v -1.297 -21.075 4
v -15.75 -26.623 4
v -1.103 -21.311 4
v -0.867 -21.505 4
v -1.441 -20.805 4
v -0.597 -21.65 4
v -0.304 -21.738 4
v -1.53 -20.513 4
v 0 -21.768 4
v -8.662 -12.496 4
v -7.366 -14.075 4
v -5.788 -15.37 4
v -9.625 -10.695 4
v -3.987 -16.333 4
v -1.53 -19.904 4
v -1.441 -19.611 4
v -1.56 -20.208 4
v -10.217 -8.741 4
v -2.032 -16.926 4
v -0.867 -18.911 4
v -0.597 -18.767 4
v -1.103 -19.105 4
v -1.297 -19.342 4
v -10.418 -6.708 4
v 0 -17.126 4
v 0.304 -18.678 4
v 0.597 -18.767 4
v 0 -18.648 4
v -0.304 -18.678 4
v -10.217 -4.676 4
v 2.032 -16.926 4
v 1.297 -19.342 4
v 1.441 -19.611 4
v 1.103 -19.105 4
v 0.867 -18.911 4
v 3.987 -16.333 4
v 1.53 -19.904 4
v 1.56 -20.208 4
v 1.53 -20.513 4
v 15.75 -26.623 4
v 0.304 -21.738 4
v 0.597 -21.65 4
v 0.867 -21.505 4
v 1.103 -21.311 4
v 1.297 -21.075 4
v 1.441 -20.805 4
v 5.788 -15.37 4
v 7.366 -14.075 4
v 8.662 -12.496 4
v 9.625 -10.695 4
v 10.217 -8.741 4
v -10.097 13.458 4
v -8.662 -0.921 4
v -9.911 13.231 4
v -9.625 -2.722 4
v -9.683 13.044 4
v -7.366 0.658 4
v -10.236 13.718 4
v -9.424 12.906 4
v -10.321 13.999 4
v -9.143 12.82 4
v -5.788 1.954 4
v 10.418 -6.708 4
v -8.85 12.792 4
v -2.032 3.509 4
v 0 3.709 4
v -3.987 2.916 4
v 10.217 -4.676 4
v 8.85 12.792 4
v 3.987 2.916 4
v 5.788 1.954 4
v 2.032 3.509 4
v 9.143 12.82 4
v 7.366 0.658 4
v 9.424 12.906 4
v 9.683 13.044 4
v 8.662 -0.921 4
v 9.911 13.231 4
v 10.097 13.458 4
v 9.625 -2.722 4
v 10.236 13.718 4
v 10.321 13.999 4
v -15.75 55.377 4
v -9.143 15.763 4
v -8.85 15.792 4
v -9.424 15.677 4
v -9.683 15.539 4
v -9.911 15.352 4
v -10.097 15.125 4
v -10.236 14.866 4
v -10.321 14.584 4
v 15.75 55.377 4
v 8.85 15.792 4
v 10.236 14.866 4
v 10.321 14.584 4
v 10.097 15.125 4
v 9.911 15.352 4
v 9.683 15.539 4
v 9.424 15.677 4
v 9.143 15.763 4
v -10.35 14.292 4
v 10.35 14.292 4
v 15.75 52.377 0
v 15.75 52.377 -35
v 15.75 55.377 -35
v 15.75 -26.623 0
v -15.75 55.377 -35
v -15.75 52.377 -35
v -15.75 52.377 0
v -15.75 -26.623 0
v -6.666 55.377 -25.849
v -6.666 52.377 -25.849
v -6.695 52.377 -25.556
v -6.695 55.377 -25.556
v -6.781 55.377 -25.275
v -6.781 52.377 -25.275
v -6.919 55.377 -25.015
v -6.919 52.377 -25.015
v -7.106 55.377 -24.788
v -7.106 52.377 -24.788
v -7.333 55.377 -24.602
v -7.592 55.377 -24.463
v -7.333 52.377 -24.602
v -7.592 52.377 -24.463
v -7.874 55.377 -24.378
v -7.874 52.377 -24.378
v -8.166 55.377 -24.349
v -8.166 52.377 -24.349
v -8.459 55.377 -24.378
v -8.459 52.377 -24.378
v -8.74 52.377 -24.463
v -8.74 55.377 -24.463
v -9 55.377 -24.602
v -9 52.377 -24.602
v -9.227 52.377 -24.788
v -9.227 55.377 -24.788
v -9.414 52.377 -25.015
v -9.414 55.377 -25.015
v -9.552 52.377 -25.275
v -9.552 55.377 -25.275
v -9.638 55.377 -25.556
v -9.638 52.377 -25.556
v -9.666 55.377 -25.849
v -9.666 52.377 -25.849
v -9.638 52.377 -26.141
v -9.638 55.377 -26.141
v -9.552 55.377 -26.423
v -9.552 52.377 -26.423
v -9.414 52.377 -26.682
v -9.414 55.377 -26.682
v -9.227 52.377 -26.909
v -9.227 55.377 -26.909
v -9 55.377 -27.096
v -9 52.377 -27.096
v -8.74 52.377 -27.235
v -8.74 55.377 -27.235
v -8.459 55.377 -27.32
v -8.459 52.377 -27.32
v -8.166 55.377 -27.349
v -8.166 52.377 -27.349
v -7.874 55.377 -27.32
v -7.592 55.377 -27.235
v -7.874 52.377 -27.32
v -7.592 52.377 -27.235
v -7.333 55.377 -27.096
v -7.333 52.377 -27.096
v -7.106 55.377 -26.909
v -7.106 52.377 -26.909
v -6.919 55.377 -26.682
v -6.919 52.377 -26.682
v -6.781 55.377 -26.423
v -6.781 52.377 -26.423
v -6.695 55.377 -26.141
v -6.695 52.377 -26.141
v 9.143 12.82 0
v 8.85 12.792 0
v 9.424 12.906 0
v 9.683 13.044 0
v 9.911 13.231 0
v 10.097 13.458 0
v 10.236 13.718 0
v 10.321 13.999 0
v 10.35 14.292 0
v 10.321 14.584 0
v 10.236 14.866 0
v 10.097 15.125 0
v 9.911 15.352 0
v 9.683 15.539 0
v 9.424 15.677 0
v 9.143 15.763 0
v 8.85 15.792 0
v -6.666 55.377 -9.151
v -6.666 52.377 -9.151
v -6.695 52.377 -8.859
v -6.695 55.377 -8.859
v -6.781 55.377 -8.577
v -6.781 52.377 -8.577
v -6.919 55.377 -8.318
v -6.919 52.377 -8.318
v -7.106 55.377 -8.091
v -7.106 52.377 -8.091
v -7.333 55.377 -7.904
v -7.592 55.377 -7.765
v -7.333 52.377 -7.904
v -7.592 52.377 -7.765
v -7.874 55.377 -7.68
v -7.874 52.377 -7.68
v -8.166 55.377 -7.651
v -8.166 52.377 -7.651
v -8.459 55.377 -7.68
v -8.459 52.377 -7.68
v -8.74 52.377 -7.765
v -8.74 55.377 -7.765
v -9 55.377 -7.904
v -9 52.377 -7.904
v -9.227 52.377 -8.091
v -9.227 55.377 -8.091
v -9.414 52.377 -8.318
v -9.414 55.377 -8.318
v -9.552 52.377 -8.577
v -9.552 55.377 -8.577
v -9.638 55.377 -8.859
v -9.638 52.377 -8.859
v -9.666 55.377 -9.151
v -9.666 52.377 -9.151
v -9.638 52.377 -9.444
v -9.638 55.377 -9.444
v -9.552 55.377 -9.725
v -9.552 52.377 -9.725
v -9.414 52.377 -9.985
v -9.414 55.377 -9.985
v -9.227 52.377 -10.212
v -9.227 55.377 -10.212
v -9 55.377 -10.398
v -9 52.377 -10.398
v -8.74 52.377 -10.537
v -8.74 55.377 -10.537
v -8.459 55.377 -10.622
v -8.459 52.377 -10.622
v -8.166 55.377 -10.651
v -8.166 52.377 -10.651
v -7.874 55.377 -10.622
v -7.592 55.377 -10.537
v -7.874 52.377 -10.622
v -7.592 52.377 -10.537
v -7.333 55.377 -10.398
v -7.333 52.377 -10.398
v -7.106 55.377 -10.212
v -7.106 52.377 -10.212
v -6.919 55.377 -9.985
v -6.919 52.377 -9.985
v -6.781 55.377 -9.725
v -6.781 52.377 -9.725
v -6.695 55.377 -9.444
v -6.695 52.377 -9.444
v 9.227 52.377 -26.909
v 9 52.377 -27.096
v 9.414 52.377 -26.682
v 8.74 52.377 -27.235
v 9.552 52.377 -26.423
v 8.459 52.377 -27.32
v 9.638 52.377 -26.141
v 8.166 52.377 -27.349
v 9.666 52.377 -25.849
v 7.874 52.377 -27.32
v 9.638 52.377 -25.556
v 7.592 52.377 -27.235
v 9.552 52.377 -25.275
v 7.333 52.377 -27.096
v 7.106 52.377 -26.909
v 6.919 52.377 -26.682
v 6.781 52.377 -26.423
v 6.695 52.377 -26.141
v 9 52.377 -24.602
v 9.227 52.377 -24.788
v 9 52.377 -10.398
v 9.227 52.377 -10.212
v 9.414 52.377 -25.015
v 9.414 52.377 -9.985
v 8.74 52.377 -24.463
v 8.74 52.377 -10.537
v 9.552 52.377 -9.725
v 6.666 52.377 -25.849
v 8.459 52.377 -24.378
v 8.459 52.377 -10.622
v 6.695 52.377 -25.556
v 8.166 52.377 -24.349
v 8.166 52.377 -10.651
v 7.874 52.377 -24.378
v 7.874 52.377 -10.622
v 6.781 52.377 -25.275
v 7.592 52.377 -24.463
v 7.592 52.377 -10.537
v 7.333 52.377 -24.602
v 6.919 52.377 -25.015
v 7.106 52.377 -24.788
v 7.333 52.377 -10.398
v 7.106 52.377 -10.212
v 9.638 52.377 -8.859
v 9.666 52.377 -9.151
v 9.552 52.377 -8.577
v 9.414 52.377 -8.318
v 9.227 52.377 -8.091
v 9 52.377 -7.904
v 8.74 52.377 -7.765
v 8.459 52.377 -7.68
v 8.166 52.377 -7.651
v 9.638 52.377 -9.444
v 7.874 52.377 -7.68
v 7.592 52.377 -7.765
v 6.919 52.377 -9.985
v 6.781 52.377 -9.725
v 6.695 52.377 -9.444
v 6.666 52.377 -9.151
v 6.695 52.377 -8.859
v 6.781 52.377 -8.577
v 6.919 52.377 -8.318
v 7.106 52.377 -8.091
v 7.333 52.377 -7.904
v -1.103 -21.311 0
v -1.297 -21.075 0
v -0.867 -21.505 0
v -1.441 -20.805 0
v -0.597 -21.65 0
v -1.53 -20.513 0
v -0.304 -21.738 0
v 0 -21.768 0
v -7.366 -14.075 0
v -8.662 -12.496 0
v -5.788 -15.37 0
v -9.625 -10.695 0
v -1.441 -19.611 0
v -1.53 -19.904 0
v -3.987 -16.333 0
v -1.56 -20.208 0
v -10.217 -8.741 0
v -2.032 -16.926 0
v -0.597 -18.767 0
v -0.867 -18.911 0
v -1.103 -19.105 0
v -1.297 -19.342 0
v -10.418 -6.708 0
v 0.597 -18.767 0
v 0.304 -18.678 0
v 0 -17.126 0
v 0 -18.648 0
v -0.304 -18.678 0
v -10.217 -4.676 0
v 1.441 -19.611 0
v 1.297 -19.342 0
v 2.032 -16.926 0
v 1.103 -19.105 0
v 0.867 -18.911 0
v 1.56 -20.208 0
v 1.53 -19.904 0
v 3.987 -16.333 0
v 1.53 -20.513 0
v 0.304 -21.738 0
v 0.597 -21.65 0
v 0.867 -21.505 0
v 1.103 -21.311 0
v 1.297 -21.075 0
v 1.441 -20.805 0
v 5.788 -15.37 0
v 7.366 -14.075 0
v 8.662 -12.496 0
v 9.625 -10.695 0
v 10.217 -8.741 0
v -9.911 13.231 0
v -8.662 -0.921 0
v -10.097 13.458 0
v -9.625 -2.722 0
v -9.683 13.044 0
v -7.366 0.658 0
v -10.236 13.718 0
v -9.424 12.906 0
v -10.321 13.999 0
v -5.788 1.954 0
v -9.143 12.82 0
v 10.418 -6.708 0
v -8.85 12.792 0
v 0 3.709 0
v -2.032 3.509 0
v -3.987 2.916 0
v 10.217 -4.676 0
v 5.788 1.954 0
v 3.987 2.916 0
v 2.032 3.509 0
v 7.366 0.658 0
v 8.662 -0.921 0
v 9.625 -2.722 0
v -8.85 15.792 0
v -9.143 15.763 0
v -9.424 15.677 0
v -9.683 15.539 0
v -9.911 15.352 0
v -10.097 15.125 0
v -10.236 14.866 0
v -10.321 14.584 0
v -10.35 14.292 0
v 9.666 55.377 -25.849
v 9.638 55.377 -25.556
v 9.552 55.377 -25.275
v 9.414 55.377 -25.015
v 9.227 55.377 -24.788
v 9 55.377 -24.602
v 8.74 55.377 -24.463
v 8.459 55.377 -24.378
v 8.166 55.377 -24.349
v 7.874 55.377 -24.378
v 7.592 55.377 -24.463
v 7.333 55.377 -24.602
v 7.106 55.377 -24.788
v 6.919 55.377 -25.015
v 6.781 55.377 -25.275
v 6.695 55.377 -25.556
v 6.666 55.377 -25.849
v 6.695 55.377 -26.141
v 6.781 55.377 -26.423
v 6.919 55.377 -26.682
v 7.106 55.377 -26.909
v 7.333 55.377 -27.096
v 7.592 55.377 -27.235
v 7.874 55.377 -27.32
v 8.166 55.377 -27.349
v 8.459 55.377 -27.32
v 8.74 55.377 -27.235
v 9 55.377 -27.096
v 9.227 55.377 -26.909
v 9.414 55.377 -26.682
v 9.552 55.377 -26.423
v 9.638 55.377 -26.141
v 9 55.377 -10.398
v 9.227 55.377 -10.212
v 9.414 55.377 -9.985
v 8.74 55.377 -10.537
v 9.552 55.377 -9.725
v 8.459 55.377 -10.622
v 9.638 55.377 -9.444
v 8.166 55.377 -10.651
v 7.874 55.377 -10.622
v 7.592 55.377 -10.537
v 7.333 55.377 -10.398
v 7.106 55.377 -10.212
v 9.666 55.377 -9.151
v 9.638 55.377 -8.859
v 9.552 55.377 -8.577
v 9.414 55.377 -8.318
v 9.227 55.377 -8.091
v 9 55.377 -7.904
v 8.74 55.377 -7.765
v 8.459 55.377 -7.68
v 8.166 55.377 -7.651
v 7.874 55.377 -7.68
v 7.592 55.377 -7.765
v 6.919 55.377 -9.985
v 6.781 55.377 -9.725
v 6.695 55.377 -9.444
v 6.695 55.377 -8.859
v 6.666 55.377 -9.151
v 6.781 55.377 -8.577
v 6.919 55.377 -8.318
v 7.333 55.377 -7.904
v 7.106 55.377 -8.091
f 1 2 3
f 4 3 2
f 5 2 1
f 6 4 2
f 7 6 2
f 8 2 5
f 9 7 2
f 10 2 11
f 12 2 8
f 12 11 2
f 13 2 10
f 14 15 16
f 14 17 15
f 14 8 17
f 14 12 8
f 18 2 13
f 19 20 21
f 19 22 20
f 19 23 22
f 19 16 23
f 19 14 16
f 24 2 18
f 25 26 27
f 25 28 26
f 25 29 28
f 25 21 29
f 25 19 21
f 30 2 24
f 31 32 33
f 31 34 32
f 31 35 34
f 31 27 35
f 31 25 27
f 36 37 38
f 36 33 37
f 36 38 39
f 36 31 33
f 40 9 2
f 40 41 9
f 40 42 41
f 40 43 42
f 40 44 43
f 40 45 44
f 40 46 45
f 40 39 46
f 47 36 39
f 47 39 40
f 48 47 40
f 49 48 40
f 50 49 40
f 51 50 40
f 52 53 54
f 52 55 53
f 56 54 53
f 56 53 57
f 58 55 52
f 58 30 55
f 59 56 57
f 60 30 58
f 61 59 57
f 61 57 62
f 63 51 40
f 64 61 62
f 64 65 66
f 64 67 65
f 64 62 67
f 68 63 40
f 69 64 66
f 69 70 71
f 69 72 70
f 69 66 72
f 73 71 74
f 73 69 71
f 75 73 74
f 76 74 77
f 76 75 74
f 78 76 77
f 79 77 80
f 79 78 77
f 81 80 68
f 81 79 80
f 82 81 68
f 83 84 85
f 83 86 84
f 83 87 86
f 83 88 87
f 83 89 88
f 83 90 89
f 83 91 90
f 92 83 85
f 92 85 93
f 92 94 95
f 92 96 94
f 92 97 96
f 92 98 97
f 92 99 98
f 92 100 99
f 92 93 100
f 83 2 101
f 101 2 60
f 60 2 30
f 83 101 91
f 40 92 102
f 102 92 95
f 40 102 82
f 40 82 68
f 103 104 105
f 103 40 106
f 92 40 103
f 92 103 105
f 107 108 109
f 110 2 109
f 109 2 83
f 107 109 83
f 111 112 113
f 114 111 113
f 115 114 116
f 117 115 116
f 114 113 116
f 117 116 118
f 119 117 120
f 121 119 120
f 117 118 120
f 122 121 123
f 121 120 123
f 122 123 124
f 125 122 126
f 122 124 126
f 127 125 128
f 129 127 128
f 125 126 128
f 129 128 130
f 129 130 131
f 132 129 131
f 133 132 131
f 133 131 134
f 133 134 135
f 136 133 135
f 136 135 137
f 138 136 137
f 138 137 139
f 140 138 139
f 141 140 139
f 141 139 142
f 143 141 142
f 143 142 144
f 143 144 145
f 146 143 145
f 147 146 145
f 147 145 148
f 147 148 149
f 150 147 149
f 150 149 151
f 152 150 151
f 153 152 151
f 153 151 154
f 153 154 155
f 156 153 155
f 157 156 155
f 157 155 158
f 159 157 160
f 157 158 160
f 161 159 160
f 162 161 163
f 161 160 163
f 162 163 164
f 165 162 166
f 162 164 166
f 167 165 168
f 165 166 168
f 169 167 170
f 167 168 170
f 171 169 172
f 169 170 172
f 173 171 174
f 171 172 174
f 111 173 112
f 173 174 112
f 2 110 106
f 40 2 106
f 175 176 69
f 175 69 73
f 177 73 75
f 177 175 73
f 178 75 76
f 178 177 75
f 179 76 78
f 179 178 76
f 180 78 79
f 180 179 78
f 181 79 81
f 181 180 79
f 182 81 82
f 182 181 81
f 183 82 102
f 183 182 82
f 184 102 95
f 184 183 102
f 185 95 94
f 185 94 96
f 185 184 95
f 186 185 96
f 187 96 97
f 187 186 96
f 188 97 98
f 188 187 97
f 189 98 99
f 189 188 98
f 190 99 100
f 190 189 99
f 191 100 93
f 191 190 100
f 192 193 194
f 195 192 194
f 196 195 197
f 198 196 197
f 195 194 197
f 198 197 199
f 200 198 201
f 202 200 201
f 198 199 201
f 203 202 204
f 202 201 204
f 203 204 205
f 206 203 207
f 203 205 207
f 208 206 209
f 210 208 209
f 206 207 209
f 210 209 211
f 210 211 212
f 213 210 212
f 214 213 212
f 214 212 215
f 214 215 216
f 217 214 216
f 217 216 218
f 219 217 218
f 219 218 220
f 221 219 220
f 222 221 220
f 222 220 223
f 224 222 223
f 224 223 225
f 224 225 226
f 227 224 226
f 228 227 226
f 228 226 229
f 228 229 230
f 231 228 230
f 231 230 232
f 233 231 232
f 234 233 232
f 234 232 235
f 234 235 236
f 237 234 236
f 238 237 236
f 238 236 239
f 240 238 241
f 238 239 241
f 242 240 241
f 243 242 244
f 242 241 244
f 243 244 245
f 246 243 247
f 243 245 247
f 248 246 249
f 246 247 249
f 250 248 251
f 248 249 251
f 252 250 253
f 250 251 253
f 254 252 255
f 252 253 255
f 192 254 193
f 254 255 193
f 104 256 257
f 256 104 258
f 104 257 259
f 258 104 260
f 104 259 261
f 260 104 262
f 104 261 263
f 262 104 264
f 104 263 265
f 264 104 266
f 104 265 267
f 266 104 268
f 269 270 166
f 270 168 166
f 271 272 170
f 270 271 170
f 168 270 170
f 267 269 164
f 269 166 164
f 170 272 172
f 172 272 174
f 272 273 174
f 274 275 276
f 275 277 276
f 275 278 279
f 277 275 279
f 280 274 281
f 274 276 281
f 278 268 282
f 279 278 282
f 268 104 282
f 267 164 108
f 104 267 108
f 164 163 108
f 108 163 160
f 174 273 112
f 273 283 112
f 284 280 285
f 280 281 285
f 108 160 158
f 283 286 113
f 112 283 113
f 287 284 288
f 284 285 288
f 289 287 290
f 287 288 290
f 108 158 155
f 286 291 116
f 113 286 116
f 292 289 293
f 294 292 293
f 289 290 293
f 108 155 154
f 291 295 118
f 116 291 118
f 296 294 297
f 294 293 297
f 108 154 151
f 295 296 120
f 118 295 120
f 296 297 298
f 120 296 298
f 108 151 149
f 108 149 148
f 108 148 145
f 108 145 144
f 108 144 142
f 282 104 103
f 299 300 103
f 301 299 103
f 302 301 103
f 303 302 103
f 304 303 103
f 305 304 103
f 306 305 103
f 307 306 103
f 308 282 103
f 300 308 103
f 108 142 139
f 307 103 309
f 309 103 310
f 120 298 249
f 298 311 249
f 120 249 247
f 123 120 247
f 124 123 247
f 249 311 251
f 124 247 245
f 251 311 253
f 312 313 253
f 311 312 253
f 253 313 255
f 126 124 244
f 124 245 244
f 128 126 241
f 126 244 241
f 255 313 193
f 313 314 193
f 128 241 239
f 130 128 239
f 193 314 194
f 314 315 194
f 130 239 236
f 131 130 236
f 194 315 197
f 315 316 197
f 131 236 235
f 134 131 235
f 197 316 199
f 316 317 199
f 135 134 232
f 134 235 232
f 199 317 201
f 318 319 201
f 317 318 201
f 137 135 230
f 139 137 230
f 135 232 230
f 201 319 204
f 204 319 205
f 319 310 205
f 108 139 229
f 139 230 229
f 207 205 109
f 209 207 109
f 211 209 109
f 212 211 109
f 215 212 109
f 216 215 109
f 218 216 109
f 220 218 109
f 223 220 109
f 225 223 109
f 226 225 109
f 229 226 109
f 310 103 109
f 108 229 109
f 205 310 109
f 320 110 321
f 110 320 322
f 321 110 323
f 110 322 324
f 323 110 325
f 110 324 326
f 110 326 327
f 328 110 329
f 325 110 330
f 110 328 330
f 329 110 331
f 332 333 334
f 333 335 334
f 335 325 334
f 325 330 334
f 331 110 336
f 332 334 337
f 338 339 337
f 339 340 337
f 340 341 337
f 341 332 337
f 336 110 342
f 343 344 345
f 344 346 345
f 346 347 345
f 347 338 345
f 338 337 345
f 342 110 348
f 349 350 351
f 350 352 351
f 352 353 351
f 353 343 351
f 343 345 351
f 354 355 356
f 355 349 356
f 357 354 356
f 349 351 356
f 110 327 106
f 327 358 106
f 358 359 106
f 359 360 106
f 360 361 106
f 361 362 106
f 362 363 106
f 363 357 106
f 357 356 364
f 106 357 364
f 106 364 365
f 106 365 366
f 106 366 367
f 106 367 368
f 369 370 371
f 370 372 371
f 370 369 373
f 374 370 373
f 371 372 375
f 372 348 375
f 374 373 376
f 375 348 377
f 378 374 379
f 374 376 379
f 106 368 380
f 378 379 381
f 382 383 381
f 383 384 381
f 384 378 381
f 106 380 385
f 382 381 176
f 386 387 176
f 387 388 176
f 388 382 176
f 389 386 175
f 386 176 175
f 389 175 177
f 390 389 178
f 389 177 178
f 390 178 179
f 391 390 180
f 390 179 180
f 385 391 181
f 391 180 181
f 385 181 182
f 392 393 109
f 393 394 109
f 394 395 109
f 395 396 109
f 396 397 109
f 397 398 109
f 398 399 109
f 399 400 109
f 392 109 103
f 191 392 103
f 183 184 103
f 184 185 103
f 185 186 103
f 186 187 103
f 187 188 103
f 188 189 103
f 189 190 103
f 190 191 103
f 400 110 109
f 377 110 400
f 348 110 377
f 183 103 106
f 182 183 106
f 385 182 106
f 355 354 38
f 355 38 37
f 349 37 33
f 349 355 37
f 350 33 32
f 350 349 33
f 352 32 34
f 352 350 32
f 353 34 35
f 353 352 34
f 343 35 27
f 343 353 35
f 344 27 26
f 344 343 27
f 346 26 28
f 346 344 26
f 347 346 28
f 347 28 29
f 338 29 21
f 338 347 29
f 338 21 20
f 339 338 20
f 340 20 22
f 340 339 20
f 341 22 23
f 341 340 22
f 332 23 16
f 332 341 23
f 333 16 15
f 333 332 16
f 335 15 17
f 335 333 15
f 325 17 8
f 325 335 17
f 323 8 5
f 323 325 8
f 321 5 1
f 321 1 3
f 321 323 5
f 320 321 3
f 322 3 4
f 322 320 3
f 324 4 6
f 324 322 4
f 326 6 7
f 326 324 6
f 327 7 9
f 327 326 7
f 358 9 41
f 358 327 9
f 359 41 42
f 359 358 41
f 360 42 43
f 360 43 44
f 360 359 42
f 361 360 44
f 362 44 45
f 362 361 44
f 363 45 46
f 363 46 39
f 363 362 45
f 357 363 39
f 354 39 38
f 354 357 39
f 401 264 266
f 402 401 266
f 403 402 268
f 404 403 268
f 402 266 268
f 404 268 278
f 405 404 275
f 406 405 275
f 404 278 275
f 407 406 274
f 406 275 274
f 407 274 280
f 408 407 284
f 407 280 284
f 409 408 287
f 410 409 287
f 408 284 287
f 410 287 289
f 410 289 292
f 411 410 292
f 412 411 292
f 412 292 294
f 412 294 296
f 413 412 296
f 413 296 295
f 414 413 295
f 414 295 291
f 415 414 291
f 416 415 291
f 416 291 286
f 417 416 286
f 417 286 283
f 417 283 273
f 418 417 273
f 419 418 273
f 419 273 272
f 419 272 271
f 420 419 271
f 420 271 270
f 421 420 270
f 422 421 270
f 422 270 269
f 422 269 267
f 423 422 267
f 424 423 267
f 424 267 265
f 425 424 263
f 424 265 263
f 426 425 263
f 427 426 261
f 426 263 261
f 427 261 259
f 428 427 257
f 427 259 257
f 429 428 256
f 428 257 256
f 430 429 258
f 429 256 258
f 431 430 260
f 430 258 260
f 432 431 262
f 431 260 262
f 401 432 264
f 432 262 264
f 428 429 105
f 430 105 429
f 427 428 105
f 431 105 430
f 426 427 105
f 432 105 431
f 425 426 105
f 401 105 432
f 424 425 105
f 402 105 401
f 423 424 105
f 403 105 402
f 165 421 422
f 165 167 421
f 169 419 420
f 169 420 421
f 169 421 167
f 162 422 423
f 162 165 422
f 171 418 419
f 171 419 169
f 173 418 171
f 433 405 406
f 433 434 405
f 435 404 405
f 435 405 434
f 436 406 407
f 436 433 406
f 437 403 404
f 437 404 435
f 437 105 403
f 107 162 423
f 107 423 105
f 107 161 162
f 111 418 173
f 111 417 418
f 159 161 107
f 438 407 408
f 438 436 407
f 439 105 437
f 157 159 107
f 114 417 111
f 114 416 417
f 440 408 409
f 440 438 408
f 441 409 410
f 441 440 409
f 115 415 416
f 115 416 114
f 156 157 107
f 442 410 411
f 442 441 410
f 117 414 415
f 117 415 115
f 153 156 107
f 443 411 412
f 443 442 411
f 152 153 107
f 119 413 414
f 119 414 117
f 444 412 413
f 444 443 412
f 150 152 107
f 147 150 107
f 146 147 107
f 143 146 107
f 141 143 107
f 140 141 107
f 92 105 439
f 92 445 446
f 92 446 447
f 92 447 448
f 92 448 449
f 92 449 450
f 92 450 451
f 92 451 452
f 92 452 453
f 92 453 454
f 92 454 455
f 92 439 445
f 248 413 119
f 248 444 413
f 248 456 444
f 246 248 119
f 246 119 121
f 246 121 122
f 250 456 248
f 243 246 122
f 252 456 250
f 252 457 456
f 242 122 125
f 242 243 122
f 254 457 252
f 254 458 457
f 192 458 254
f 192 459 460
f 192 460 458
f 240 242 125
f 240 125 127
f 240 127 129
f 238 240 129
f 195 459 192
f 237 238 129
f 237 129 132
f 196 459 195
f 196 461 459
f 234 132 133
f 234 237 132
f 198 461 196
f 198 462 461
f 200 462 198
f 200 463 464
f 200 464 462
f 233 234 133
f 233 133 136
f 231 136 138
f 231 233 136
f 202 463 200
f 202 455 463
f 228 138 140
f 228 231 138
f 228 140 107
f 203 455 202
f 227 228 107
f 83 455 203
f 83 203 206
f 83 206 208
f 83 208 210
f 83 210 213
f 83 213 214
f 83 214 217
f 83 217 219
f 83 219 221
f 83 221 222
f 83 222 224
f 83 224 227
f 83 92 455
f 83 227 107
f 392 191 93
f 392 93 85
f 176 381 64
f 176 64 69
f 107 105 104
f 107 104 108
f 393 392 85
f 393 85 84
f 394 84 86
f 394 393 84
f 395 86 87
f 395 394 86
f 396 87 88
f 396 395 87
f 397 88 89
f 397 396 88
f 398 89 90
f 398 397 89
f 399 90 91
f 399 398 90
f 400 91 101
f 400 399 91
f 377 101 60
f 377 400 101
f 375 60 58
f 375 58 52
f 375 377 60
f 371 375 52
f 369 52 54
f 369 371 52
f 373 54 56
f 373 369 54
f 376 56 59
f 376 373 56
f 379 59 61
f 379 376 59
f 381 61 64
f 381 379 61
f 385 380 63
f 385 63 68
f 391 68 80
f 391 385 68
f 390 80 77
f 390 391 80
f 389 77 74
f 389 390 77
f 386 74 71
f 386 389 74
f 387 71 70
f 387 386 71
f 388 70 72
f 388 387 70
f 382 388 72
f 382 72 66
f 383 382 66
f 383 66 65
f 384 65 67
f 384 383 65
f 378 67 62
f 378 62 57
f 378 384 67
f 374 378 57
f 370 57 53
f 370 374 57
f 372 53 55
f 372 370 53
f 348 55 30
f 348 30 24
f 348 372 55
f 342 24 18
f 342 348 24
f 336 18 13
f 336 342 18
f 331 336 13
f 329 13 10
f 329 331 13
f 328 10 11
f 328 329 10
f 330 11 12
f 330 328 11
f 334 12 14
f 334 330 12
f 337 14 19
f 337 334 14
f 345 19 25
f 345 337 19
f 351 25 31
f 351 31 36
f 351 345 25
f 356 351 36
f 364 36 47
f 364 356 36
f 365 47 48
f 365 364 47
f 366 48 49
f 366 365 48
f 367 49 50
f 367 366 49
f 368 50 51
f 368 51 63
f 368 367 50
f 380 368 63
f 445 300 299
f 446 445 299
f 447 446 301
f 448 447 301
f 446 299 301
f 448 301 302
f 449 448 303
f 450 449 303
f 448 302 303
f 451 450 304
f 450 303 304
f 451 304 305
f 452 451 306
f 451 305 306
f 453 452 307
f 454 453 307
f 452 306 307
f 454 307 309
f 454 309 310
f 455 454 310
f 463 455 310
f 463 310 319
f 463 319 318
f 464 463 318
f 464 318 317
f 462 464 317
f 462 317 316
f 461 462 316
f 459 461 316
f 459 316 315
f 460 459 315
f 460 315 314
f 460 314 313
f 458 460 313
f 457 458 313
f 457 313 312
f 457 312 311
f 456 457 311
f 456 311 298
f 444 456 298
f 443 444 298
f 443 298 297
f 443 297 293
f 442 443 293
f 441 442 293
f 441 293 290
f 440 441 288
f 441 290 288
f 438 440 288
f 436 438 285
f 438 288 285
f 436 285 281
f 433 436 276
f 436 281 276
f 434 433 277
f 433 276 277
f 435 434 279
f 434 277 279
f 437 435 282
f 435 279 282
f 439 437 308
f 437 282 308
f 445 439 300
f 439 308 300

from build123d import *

# Parameters (mm, degrees)
SKETCH_1_W          = 31.500863908
SKETCH_1_H          = 82
SKETCH_1_R          = 10.417524335
SKETCH_1_R_2        = 1.56
EXTRUDE_1_DEPTH     = 4
SKETCH_3_W          = 31.500863908
SKETCH_3_H          = 3
EXTRUDE_2_DEPTH     = 35
SKETCH_6_R          = 1.5
CUT_EXTRUDE_1_DEPTH = 4


with BuildPart() as part:
    # 草图1 → 凸台-拉伸1 (new body)
    with BuildSketch(Plane.XY):
        with Locations((0, 14.377078694)):
            Rectangle(SKETCH_1_W, SKETCH_1_H)
        with Locations((0, -6.708333333)):
            Circle(SKETCH_1_R, mode=Mode.SUBTRACT)
        with Locations((0, -20.208333333)):
            Circle(SKETCH_1_R_2, mode=Mode.SUBTRACT)
        with BuildLine():
            Line((8.85, 15.791666667), (-8.85, 15.791666667))
            ThreePointArc((-8.85, 15.791666667), (-10.35, 14.291666667), (-8.85, 12.791666667))
            Line((-8.85, 12.791666667), (8.85, 12.791666667))
            ThreePointArc((8.85, 12.791666667), (10.35, 14.291666667), (8.85, 15.791666667))
        make_face(mode=Mode.SUBTRACT)
    extrude(amount=EXTRUDE_1_DEPTH)

    # 草图3 → 凸台-拉伸2 (add)
    with BuildSketch(Plane(origin=(0, 0, 0), x_dir=(-1, 0, 0), z_dir=(0, 0, -1))):
        with Locations((0, 53.877078694)):
            Rectangle(SKETCH_3_W, SKETCH_3_H)
    extrude(amount=EXTRUDE_2_DEPTH)

    # 草图6 → 切除-拉伸1 (cut, through all)
    with BuildSketch(Plane.XZ.offset(-52.377078694)):
        with Locations((-8.166436246, -9.151254402)):
            Circle(SKETCH_6_R)
        with Locations((8.166436246, -9.151254402)):
            Circle(SKETCH_6_R)
        with Locations((8.166436246, -25.848745598)):
            Circle(SKETCH_6_R)
        with Locations((-8.166436246, -25.848745598)):
            Circle(SKETCH_6_R)
    extrude(amount=-CUT_EXTRUDE_1_DEPTH, mode=Mode.SUBTRACT)


solid = part.part
